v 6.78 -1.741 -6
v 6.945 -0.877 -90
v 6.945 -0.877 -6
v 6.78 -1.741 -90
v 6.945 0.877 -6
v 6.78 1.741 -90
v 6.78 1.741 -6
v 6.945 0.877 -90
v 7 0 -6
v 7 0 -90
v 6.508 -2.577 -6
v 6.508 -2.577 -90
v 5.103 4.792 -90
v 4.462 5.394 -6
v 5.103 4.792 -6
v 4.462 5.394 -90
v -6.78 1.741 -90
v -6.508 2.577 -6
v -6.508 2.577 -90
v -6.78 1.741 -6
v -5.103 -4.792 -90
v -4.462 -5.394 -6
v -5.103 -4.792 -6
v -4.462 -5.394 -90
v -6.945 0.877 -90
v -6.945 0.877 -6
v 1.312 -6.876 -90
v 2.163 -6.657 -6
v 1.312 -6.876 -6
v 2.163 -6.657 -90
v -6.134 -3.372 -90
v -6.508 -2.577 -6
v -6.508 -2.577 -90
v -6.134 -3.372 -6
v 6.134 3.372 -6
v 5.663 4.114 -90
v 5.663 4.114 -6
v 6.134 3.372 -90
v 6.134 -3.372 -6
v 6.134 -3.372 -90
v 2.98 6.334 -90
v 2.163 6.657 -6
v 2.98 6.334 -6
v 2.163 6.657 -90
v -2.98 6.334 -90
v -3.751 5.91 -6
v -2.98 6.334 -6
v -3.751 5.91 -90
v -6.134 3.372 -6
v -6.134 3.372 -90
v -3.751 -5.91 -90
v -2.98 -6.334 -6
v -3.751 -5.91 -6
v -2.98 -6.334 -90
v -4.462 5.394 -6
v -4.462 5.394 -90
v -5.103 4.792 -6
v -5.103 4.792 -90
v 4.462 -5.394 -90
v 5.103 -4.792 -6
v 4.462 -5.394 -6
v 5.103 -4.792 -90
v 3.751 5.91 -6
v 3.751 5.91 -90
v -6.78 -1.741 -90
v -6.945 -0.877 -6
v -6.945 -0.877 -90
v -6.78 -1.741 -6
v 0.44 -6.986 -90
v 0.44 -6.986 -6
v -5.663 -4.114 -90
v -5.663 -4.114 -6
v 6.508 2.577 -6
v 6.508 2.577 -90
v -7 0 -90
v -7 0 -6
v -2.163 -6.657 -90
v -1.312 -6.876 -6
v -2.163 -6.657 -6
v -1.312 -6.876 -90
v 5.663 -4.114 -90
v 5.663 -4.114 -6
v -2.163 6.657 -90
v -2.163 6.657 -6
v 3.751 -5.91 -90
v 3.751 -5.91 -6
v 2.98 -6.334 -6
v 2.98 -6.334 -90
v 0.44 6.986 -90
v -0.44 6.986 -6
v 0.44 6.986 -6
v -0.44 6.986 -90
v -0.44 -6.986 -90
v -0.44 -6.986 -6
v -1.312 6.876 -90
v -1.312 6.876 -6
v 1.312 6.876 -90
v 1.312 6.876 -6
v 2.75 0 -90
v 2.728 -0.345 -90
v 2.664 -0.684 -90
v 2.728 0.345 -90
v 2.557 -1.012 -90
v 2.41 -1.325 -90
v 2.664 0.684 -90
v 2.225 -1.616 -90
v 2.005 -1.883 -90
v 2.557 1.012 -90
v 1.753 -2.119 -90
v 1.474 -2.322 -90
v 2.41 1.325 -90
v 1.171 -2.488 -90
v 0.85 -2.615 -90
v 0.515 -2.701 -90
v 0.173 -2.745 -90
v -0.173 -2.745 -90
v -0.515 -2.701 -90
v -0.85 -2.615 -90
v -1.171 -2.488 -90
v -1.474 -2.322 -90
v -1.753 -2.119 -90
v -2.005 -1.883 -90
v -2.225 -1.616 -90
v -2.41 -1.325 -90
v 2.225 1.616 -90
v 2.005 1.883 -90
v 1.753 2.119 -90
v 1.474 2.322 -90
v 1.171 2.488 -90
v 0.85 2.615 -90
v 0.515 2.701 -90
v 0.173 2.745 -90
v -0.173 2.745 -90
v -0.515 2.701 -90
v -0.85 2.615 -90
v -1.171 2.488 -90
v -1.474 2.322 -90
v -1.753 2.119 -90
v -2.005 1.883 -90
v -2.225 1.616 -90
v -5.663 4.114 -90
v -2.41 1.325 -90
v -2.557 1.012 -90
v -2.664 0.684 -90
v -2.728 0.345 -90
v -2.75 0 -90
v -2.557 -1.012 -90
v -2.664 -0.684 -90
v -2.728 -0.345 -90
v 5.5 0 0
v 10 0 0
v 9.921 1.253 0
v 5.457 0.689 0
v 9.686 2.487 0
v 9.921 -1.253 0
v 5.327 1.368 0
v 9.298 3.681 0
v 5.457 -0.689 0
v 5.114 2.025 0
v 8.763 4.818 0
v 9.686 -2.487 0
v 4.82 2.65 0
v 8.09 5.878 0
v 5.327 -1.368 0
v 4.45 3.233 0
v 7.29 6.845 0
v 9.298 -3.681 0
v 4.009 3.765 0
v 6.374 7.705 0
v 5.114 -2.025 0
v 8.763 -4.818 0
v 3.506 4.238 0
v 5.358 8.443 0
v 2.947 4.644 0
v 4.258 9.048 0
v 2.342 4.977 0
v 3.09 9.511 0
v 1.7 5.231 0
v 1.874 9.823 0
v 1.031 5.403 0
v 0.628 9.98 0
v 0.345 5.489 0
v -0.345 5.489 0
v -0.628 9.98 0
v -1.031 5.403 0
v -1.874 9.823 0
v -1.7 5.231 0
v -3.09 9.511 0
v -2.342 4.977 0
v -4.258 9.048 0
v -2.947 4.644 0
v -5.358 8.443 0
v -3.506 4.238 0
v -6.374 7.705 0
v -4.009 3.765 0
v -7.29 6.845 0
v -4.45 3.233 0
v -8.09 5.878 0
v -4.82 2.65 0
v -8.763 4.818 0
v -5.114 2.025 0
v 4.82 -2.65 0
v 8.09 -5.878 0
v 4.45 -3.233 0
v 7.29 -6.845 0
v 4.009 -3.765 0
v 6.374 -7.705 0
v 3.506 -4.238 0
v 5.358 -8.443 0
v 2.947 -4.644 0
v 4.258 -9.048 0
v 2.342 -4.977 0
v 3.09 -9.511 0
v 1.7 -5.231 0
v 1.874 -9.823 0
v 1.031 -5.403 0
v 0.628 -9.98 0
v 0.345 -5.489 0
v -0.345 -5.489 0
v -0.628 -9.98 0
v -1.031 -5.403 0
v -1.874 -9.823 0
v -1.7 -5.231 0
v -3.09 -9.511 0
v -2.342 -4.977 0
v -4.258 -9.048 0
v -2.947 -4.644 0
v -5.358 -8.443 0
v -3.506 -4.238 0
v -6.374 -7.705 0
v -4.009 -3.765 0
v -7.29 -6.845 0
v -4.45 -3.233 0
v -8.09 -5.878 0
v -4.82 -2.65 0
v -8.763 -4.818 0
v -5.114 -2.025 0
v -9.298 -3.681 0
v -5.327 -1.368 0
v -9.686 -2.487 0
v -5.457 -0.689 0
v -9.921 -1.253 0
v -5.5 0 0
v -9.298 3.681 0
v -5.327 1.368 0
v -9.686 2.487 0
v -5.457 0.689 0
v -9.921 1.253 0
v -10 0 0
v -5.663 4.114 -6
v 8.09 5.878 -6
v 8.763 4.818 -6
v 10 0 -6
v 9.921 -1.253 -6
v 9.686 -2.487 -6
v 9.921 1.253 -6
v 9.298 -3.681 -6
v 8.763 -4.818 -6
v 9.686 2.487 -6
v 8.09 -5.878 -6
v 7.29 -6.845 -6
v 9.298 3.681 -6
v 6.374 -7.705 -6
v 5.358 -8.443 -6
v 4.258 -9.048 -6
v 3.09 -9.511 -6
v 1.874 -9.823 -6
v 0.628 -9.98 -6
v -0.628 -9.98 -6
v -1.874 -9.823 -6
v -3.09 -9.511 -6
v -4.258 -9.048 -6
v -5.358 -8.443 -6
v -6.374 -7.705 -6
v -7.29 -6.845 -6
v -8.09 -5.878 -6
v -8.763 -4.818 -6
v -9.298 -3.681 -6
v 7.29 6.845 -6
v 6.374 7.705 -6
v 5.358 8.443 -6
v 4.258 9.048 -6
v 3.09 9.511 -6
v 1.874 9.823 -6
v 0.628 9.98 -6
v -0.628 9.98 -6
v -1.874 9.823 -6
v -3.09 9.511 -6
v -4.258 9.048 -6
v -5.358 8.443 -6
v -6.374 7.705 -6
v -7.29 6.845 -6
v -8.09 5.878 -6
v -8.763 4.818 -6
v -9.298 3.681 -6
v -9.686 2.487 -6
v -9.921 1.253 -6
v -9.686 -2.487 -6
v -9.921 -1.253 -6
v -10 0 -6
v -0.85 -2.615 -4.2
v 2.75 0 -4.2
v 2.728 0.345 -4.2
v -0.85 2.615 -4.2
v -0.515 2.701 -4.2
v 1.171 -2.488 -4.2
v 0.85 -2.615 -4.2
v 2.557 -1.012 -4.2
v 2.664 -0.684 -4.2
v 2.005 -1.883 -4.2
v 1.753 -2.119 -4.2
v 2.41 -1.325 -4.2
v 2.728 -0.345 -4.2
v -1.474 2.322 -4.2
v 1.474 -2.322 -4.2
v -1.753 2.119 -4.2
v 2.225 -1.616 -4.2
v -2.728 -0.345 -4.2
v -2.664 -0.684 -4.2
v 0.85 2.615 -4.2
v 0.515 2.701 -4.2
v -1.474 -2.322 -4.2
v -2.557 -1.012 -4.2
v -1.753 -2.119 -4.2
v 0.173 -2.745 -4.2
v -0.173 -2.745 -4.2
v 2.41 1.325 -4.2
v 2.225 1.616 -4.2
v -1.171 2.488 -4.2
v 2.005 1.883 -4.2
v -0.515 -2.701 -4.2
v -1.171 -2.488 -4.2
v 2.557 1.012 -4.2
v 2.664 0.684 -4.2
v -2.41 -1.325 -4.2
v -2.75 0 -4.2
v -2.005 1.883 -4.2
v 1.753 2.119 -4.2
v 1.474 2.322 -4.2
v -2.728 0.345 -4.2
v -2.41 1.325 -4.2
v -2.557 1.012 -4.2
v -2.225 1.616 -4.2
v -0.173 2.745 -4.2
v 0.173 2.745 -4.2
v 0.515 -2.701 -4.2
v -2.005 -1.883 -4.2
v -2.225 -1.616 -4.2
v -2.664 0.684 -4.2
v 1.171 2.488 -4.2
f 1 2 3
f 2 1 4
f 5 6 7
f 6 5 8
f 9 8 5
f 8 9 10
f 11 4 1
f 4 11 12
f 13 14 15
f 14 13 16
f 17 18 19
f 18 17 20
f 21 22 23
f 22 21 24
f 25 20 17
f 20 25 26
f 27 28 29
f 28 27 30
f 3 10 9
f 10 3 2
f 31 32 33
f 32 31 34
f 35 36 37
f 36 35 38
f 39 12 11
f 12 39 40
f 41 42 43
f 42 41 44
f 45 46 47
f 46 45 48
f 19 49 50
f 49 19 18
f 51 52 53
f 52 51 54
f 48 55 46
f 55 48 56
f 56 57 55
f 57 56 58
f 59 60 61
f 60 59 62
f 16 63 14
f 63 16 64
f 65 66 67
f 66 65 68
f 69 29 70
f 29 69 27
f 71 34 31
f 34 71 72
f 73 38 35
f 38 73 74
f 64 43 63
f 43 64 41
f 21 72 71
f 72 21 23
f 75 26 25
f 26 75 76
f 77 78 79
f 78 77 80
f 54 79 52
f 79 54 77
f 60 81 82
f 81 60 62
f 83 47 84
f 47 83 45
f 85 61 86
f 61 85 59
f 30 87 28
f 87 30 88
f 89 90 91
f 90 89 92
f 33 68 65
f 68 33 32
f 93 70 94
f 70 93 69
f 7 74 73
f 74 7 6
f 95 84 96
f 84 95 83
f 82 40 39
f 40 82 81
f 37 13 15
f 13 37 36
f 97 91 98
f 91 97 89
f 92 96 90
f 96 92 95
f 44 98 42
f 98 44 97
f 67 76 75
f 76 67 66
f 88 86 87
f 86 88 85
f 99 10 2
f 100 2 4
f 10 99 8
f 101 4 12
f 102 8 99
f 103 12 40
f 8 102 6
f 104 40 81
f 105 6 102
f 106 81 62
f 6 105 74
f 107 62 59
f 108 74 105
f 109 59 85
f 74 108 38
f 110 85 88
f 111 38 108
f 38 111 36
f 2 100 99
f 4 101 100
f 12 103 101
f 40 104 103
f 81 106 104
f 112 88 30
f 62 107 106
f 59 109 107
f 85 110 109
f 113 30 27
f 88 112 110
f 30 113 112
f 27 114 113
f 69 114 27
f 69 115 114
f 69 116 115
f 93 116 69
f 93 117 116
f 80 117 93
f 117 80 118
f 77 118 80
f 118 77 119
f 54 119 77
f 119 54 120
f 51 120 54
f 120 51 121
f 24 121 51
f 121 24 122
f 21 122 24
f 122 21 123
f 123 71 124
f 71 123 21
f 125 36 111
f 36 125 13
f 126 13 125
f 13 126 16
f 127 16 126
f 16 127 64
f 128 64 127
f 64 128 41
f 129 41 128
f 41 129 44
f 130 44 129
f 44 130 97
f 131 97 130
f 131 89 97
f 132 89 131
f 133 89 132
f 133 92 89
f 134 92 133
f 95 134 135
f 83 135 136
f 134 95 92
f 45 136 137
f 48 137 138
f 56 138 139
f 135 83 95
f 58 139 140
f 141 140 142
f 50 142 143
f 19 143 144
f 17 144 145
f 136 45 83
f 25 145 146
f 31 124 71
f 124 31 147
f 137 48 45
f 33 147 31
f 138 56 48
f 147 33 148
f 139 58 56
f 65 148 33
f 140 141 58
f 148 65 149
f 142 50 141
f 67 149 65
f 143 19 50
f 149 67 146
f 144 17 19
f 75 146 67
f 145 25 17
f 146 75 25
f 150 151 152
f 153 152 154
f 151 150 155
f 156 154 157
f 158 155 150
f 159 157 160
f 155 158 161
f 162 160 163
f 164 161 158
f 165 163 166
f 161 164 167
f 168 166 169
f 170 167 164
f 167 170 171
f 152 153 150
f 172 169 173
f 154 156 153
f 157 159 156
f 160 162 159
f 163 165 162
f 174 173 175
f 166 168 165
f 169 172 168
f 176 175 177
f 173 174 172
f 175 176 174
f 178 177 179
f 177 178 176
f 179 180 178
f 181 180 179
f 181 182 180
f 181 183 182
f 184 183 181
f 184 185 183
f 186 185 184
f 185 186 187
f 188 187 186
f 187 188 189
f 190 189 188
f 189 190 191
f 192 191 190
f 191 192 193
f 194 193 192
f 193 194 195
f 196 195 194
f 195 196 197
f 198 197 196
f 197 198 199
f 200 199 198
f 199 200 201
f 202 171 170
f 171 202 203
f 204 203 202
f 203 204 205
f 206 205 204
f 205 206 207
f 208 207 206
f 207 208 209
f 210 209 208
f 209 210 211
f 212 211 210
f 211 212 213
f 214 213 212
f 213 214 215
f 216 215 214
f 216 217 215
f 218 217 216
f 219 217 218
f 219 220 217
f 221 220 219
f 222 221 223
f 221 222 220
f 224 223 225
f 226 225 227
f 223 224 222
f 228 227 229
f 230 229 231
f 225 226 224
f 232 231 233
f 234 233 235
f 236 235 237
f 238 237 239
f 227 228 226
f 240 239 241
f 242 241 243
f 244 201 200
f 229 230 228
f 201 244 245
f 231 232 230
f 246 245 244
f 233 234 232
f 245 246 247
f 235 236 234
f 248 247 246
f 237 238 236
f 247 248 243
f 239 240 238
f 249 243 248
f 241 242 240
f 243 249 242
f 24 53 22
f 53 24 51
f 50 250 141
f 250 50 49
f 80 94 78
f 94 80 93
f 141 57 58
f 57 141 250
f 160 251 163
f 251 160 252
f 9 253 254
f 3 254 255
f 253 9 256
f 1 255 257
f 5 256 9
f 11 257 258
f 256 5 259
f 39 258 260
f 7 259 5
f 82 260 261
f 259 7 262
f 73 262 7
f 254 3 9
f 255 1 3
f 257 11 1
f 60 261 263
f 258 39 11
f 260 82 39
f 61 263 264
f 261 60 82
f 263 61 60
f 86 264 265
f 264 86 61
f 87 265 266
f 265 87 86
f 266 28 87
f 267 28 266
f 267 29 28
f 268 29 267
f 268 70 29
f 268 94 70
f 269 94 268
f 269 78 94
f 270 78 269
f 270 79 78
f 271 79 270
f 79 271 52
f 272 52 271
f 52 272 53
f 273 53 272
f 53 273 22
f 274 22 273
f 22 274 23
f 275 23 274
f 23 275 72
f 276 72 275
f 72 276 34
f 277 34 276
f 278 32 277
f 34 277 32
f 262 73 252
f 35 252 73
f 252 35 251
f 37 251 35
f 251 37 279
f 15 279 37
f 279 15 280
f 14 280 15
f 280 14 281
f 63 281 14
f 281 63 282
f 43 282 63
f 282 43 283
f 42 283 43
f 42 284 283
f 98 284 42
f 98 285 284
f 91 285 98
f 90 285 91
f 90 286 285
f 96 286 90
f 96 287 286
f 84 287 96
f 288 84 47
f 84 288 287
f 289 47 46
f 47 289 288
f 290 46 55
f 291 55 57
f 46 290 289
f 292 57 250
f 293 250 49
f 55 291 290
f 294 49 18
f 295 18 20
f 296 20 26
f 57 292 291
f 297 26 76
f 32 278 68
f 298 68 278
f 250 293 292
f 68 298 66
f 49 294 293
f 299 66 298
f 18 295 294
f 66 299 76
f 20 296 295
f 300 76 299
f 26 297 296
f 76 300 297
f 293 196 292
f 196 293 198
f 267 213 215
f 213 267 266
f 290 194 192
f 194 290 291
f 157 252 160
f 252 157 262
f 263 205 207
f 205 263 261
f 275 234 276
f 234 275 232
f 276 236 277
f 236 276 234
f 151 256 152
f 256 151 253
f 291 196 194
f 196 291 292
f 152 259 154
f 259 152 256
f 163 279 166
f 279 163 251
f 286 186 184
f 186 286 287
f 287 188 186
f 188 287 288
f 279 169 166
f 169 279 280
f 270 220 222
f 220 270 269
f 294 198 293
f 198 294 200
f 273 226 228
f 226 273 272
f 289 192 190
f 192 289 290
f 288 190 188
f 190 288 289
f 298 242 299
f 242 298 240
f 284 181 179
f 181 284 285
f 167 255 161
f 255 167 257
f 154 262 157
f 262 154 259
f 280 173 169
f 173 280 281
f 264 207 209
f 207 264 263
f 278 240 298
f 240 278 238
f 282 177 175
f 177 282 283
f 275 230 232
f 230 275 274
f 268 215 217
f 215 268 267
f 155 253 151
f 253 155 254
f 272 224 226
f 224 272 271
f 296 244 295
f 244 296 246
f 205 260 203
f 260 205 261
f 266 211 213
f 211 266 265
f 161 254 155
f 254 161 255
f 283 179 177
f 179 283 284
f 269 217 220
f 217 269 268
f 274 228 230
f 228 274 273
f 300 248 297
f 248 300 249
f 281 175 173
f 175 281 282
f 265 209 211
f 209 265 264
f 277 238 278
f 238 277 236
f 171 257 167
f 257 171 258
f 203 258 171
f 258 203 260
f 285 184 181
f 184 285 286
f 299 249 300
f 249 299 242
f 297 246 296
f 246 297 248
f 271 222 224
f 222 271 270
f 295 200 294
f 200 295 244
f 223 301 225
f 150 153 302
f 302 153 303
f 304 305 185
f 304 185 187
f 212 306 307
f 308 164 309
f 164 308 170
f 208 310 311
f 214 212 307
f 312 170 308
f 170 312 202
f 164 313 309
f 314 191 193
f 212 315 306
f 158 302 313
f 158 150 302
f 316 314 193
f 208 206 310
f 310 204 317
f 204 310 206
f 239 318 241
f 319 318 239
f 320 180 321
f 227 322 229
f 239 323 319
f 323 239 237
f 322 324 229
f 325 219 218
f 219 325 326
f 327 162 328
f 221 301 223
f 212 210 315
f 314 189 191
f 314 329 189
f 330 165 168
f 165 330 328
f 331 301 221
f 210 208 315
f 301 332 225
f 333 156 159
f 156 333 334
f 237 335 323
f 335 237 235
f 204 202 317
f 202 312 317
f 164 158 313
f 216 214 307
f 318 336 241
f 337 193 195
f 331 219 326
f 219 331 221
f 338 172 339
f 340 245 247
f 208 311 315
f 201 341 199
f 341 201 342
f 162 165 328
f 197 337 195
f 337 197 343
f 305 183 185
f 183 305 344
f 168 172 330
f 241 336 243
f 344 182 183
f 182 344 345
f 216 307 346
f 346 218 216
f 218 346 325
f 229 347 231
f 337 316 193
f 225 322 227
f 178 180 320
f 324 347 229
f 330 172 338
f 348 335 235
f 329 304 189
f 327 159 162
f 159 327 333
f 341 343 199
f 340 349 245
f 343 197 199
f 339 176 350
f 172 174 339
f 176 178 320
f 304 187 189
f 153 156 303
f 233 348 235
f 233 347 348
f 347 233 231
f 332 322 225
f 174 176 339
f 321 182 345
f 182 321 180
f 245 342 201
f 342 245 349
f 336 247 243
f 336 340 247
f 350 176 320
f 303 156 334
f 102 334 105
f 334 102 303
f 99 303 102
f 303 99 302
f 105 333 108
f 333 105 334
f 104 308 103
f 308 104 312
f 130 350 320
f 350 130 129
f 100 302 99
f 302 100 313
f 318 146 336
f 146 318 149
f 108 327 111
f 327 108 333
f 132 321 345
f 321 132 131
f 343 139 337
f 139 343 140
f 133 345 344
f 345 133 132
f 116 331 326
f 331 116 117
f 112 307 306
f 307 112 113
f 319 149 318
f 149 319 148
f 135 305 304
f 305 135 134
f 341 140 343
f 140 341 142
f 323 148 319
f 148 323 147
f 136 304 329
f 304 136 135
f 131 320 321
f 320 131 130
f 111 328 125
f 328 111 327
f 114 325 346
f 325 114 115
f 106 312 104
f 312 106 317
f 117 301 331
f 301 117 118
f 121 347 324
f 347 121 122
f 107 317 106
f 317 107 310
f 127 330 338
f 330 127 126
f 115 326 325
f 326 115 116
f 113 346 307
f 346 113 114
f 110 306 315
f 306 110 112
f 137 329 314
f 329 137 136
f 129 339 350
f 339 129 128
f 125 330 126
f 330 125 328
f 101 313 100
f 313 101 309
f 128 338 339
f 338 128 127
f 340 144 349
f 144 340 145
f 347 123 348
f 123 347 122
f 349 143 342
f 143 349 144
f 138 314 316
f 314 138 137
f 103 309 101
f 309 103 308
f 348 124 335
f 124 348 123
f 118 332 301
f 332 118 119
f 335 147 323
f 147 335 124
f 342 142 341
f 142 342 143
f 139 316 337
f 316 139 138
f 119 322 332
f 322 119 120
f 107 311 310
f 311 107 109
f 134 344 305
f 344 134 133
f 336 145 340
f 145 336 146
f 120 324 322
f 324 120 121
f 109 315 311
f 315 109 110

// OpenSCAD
$fn = 50;


difference() {
	union() {
		translate(v = [0, 0, -90.0000000000]) {
			cylinder(h = 90, r = 7.0000000000);
		}
		translate(v = [0, 0, -6.0000000000]) {
			cylinder(h = 6, r = 10.0000000000);
		}
	}
	union() {
		translate(v = [0, 0, 0]) {
			rotate(a = [0, 0, 0]) {
				difference() {
					union() {
						#translate(v = [0, 0, -90.0000000000]) {
							cylinder(h = 90, r = 2.2500000000);
						}
						#translate(v = [0, 0, -4.2000000000]) {
							cylinder(h = 4.2000000000, r1 = 2.7500000000, r2 = 5.5000000000);
						}
						#translate(v = [0, 0, -90.0000000000]) {
							cylinder(h = 90, r = 2.7500000000);
						}
						#translate(v = [0, 0, -90.0000000000]) {
							cylinder(h = 90, r = 2.2500000000);
						}
					}
					union();
				}
			}
		}
	}
}
